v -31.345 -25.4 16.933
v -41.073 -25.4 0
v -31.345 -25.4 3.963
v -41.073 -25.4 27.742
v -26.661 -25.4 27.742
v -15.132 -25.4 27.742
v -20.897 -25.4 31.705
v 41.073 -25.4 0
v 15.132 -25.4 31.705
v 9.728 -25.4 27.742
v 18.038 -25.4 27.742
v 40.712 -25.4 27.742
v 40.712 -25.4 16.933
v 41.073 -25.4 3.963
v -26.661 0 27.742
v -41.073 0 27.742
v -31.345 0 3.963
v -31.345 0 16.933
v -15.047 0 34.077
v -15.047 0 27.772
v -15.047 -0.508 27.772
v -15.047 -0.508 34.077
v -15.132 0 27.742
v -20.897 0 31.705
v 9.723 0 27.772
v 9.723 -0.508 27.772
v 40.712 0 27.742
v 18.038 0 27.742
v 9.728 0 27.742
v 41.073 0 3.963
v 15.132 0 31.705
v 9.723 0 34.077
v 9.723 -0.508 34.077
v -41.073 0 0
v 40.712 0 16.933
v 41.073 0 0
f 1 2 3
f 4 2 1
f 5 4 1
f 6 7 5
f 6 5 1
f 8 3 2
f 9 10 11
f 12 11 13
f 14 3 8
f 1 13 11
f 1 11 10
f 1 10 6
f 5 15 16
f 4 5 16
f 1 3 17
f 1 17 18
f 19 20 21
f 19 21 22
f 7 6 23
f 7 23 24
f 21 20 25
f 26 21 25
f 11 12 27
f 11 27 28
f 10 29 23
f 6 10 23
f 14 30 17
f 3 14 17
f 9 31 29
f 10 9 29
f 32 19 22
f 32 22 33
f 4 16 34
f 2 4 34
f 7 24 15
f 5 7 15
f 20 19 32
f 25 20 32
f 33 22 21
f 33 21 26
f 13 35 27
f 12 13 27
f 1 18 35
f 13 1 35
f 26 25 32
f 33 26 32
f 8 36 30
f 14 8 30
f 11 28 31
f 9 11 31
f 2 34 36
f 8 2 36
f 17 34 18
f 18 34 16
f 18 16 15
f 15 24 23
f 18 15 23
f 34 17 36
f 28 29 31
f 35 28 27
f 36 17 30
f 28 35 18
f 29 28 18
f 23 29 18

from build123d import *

# Parameters (mm, degrees)
F1_DEPTH = 25.4
F2_W     = 24.769693
F2_H     = 6.305011
F3_DEPTH = 0.508


with BuildPart() as f1:
    # F0 (on Front) → F1 (new body)
    with BuildSketch(Plane.XZ):
        Polygon((-41.072659, 27.742058), (-41.072659, 0), (41.072659, 0), (41.072659, 3.963152), (-31.344924, 3.963152), (-31.344924, 16.933465), (40.712364, 16.933465), (40.712364, 27.742058), (18.038339, 27.742058), (9.727733, 27.742058), (-15.132032, 27.742058), (-26.661199, 27.742058), align=None)
        Polygon((-20.896615, 31.705208), (-26.661199, 27.742058), (-15.132032, 27.742058), align=None)
        Polygon((15.132029, 31.705208), (9.727733, 27.742058), (18.038339, 27.742058), align=None)
    extrude(amount=F1_DEPTH)


with BuildPart() as f3:
    # F2 (on Front) → F3 (new body)
    with BuildSketch(Plane.XZ):
        with Locations((-2.661709, 30.924048)):
            Rectangle(F2_W, F2_H)
    extrude(amount=F3_DEPTH)


solid = Compound([f1.part, f3.part])
